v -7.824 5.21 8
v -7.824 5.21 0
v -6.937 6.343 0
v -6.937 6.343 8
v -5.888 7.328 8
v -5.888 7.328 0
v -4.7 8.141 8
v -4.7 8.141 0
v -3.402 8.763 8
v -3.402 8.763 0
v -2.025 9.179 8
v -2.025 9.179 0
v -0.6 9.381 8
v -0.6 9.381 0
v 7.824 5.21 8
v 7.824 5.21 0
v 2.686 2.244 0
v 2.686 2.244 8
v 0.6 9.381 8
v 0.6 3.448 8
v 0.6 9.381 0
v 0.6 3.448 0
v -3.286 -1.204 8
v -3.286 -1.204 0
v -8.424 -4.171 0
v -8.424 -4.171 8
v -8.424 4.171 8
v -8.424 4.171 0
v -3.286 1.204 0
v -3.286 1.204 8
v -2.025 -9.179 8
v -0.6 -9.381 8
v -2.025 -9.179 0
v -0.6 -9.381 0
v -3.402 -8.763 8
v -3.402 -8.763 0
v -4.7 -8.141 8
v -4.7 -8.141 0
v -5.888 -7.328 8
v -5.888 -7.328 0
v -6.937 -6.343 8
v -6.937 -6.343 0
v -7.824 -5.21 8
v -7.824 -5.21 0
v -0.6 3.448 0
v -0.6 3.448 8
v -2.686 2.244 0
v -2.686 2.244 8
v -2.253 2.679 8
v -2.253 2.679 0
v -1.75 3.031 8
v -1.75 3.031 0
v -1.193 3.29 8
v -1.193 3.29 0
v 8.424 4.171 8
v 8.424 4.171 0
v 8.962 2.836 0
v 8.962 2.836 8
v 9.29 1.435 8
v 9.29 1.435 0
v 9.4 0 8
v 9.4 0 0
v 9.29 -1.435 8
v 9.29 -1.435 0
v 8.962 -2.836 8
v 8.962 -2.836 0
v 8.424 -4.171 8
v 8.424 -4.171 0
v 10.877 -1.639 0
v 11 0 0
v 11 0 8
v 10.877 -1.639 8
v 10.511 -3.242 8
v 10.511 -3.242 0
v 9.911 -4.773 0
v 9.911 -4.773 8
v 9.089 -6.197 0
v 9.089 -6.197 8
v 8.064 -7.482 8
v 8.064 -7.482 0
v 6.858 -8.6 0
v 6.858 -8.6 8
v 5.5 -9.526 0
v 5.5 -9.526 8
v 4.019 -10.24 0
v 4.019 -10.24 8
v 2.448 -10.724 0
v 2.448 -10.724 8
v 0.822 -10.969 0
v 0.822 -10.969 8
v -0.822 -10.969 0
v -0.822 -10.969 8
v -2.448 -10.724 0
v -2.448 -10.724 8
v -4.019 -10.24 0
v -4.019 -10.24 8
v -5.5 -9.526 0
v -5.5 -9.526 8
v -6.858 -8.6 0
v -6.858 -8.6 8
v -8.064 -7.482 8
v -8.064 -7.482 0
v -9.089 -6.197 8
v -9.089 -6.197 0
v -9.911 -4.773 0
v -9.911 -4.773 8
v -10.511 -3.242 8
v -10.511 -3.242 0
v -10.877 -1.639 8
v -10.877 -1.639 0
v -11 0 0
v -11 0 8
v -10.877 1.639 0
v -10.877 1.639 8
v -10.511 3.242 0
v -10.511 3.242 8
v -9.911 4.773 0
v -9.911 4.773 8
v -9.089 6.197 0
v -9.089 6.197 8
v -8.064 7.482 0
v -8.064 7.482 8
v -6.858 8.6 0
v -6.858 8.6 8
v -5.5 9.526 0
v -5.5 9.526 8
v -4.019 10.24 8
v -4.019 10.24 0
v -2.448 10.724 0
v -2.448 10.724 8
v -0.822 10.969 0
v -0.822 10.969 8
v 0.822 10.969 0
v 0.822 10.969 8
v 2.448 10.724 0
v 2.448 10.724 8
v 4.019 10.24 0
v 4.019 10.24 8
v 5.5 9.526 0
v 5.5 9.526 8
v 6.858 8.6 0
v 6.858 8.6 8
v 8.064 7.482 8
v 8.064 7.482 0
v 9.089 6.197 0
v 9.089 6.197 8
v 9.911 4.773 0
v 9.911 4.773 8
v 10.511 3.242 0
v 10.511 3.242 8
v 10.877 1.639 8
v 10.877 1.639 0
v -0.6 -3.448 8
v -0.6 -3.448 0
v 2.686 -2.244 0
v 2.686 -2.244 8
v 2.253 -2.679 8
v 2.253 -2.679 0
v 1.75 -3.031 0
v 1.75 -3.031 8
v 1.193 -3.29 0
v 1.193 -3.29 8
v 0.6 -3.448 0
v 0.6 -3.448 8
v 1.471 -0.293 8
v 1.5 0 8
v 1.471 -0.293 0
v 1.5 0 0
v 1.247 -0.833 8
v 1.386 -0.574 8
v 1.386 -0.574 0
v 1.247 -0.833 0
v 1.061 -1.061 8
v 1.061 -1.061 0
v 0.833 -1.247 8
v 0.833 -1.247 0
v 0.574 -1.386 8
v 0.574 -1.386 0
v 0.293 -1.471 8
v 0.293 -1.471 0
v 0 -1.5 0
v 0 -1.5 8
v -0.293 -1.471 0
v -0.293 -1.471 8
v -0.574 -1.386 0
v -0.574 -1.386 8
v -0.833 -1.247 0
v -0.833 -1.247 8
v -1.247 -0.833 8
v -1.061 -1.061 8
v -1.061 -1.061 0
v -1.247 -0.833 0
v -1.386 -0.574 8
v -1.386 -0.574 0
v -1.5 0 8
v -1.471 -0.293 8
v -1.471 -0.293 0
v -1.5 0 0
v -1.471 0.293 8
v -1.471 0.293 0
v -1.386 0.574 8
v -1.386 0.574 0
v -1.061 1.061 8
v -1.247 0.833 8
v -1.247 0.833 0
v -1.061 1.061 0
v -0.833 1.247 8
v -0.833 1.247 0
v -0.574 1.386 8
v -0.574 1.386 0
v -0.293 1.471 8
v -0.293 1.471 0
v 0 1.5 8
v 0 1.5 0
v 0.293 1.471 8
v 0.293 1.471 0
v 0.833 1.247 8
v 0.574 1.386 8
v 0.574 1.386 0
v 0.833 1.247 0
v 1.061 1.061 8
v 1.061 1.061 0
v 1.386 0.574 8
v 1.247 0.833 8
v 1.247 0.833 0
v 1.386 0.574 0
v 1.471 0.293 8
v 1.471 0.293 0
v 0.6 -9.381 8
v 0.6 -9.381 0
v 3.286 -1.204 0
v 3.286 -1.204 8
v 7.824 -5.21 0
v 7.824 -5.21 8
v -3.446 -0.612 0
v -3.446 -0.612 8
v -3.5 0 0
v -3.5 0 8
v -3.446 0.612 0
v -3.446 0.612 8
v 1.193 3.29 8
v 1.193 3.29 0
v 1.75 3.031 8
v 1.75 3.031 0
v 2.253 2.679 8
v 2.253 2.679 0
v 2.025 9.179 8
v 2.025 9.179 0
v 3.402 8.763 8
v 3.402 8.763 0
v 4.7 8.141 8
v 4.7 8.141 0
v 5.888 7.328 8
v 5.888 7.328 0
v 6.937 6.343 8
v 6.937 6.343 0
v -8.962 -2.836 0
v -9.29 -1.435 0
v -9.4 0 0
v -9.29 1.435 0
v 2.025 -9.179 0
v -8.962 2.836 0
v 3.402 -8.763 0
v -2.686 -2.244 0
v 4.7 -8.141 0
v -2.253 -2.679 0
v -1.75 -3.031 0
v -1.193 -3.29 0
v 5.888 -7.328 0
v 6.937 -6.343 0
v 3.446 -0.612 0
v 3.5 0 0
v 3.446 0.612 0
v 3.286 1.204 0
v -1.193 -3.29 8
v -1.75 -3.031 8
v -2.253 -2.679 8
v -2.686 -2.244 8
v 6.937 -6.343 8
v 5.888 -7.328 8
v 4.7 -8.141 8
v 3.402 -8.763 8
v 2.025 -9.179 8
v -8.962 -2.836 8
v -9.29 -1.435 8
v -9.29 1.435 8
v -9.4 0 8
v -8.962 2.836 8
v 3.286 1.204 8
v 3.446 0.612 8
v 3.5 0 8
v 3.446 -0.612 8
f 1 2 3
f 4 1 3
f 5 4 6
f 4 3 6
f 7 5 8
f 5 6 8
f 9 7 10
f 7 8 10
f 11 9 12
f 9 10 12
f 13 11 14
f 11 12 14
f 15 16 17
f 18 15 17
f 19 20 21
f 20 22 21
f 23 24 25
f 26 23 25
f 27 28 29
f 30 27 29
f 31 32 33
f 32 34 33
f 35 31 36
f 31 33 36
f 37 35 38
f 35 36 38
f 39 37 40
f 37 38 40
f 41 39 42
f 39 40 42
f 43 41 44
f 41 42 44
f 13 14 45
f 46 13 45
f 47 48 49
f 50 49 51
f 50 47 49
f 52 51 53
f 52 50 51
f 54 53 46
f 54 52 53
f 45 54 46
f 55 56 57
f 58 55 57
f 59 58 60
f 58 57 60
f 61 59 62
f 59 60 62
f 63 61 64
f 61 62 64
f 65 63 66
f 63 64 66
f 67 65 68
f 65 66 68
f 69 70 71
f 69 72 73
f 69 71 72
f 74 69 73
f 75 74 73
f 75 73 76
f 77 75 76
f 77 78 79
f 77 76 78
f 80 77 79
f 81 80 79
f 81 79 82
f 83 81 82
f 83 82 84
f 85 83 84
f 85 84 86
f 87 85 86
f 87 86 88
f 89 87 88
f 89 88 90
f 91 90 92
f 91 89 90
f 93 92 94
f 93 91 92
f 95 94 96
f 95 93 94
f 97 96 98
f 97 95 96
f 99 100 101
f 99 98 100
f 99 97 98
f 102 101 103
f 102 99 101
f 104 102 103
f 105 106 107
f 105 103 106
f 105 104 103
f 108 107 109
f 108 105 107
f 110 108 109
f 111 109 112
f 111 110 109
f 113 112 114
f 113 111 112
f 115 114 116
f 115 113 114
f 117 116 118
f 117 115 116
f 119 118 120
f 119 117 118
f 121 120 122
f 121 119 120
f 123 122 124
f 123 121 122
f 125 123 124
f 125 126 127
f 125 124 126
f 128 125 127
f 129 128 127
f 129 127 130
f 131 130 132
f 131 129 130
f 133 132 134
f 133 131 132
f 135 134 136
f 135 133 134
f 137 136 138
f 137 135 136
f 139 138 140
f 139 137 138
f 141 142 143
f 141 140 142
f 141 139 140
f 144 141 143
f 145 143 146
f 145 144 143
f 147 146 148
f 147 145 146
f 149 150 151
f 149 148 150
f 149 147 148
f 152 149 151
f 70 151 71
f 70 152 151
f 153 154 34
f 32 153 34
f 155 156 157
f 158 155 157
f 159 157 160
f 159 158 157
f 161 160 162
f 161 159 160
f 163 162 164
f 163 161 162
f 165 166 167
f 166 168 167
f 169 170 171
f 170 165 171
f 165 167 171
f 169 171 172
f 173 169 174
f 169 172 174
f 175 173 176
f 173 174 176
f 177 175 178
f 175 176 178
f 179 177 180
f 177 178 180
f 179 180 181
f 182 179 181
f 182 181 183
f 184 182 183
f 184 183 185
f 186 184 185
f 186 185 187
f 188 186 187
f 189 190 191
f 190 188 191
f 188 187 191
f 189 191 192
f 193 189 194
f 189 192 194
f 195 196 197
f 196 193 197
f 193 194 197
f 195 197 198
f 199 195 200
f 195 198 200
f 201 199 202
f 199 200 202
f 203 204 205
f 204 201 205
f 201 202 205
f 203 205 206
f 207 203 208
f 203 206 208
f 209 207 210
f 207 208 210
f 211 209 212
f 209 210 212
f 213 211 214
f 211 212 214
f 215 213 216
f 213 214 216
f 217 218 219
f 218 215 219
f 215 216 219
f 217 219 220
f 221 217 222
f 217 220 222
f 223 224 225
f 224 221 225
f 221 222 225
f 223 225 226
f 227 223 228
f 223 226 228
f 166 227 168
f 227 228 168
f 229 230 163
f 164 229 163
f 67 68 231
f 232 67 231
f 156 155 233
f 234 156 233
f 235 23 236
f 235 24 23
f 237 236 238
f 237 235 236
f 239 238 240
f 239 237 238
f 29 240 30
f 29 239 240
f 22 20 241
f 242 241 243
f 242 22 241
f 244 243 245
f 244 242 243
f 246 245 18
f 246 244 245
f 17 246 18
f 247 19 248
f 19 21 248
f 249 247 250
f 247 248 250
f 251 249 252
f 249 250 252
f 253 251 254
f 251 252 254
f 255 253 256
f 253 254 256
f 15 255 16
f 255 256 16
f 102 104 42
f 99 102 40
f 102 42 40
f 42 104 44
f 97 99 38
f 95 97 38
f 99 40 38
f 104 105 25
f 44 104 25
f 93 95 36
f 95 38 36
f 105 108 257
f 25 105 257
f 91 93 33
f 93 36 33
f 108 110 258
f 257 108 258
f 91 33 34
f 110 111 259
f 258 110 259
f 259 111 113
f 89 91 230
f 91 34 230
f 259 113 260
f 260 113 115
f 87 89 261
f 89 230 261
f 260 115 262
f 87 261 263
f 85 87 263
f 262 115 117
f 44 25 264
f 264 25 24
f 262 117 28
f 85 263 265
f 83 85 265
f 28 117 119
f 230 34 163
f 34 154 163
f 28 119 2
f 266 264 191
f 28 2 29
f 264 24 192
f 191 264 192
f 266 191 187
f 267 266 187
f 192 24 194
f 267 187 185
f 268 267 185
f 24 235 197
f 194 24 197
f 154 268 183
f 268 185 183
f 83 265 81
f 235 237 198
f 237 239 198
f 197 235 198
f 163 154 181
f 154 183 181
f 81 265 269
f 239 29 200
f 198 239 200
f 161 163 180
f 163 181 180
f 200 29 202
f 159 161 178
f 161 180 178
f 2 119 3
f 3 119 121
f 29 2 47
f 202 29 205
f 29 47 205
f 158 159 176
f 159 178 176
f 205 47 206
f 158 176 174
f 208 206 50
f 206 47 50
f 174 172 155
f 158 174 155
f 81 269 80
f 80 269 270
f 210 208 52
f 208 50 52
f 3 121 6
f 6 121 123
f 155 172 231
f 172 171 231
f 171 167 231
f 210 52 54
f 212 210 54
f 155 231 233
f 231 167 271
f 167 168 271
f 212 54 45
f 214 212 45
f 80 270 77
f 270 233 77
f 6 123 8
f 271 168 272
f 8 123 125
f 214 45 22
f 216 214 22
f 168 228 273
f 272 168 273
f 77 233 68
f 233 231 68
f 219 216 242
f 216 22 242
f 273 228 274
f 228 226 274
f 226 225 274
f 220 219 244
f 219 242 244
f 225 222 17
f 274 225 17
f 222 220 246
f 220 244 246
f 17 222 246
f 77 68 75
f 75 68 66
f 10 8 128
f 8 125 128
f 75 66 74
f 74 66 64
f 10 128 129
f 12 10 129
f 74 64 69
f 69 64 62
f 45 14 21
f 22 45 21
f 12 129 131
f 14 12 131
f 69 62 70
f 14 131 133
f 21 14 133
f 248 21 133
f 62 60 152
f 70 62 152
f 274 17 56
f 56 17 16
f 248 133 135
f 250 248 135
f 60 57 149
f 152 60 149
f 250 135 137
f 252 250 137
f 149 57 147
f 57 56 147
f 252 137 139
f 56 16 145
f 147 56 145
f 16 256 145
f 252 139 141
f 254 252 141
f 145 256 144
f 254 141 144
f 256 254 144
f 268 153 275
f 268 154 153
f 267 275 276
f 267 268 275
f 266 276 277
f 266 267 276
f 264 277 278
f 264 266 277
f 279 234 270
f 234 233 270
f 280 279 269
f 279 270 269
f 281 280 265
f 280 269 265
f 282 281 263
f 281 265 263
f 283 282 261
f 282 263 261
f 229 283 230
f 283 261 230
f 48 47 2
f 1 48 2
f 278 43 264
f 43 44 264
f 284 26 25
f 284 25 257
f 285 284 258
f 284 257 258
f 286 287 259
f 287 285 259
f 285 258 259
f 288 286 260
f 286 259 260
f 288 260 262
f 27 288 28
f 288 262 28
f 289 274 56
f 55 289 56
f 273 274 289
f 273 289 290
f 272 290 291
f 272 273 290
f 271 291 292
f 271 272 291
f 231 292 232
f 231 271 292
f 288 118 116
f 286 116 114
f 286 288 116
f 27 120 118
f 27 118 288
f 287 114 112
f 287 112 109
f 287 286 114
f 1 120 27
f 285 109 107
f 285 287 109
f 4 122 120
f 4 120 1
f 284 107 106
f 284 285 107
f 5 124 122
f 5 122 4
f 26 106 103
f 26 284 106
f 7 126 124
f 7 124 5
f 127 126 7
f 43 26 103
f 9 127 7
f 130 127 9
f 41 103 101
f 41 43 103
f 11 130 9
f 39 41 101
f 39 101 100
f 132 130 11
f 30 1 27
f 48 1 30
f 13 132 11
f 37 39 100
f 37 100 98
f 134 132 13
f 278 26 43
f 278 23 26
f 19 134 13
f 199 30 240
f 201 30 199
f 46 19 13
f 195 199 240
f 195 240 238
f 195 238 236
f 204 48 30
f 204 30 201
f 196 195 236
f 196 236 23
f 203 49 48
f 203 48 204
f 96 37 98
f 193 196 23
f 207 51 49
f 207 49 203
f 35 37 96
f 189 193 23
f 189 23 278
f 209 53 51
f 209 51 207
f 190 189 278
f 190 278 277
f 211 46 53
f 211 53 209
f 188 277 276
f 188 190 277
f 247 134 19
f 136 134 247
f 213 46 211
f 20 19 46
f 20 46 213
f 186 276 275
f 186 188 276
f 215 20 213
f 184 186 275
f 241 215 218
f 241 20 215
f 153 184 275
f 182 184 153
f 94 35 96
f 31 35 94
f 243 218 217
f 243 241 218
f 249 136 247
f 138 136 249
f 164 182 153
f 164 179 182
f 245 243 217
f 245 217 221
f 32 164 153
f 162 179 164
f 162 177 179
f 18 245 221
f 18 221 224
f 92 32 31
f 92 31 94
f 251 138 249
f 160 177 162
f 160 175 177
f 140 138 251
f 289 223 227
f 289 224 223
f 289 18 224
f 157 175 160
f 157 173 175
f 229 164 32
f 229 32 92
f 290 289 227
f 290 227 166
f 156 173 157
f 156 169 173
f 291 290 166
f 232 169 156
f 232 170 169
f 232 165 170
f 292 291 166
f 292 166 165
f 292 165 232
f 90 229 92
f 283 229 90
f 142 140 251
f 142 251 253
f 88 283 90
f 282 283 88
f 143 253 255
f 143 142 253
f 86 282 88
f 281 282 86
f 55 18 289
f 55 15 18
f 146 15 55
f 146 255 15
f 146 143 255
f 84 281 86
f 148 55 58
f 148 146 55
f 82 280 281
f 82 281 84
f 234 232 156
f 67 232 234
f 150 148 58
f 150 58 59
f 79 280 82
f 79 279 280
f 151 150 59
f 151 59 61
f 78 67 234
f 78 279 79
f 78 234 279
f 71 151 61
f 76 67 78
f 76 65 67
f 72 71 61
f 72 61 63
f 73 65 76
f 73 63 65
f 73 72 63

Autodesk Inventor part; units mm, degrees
ref_plane "YZ Plane" through (0, 0, 0) normal (1, 0, 0) x (0, 1, 0)
ref_plane "XZ Plane" through (0, 0, 0) normal (0, 1, 0) x (-1, 0, 0)
ref_plane "XY Plane" through (0, 0, 0) normal (0, 0, 1) x (1, 0, 0)
sketch "スケッチ1" plane through (0, 0, 0) normal (0, 0, 1) x (1, 0, 0)
  circle A0 centre (0, 0) radius 3.5
  circle A1 centre (0, 0) radius 11
  circle A2 centre (0, 0) radius 9.4
  circle A3 centre (0, 0) radius 1.5
  dimension "HUB_DIA" = 7
  dimension "DIA" = 22
  dimension "d5" = 1.6
  dimension "d16" = 3
extrude "ハブ＆リム" add sketch "スケッチ1" along normal blind 8
sketch "スケッチ2" plane through (0, 0, 0) normal (0, 0, 1) x (1, 0, 0)
  line L0 (-0.6, 2.5) -> (0.6, 2.5)
  line L1 (0.6, 2.5) -> (0.6, 10)
  line L2 (0.6, 10) -> (-0.6, 10)
  line L3 (-0.6, 10) -> (-0.6, 2.5)
  line L4 (0, 0) -> (0, 15.4673) construction
  point P0 (0, 2.5)
  dimension "d8" = 2.5
  dimension "d9" = 10
  dimension "d10" = 1.2
extrude "スポーク" add sketch "スケッチ2" along normal blind 8
pattern_circular "円形状パターン1" count 6 over 360 about axis through (0, 0, -10) along (0, 0, 1) of "スポーク"
properties part number "Wheel-D22A"
